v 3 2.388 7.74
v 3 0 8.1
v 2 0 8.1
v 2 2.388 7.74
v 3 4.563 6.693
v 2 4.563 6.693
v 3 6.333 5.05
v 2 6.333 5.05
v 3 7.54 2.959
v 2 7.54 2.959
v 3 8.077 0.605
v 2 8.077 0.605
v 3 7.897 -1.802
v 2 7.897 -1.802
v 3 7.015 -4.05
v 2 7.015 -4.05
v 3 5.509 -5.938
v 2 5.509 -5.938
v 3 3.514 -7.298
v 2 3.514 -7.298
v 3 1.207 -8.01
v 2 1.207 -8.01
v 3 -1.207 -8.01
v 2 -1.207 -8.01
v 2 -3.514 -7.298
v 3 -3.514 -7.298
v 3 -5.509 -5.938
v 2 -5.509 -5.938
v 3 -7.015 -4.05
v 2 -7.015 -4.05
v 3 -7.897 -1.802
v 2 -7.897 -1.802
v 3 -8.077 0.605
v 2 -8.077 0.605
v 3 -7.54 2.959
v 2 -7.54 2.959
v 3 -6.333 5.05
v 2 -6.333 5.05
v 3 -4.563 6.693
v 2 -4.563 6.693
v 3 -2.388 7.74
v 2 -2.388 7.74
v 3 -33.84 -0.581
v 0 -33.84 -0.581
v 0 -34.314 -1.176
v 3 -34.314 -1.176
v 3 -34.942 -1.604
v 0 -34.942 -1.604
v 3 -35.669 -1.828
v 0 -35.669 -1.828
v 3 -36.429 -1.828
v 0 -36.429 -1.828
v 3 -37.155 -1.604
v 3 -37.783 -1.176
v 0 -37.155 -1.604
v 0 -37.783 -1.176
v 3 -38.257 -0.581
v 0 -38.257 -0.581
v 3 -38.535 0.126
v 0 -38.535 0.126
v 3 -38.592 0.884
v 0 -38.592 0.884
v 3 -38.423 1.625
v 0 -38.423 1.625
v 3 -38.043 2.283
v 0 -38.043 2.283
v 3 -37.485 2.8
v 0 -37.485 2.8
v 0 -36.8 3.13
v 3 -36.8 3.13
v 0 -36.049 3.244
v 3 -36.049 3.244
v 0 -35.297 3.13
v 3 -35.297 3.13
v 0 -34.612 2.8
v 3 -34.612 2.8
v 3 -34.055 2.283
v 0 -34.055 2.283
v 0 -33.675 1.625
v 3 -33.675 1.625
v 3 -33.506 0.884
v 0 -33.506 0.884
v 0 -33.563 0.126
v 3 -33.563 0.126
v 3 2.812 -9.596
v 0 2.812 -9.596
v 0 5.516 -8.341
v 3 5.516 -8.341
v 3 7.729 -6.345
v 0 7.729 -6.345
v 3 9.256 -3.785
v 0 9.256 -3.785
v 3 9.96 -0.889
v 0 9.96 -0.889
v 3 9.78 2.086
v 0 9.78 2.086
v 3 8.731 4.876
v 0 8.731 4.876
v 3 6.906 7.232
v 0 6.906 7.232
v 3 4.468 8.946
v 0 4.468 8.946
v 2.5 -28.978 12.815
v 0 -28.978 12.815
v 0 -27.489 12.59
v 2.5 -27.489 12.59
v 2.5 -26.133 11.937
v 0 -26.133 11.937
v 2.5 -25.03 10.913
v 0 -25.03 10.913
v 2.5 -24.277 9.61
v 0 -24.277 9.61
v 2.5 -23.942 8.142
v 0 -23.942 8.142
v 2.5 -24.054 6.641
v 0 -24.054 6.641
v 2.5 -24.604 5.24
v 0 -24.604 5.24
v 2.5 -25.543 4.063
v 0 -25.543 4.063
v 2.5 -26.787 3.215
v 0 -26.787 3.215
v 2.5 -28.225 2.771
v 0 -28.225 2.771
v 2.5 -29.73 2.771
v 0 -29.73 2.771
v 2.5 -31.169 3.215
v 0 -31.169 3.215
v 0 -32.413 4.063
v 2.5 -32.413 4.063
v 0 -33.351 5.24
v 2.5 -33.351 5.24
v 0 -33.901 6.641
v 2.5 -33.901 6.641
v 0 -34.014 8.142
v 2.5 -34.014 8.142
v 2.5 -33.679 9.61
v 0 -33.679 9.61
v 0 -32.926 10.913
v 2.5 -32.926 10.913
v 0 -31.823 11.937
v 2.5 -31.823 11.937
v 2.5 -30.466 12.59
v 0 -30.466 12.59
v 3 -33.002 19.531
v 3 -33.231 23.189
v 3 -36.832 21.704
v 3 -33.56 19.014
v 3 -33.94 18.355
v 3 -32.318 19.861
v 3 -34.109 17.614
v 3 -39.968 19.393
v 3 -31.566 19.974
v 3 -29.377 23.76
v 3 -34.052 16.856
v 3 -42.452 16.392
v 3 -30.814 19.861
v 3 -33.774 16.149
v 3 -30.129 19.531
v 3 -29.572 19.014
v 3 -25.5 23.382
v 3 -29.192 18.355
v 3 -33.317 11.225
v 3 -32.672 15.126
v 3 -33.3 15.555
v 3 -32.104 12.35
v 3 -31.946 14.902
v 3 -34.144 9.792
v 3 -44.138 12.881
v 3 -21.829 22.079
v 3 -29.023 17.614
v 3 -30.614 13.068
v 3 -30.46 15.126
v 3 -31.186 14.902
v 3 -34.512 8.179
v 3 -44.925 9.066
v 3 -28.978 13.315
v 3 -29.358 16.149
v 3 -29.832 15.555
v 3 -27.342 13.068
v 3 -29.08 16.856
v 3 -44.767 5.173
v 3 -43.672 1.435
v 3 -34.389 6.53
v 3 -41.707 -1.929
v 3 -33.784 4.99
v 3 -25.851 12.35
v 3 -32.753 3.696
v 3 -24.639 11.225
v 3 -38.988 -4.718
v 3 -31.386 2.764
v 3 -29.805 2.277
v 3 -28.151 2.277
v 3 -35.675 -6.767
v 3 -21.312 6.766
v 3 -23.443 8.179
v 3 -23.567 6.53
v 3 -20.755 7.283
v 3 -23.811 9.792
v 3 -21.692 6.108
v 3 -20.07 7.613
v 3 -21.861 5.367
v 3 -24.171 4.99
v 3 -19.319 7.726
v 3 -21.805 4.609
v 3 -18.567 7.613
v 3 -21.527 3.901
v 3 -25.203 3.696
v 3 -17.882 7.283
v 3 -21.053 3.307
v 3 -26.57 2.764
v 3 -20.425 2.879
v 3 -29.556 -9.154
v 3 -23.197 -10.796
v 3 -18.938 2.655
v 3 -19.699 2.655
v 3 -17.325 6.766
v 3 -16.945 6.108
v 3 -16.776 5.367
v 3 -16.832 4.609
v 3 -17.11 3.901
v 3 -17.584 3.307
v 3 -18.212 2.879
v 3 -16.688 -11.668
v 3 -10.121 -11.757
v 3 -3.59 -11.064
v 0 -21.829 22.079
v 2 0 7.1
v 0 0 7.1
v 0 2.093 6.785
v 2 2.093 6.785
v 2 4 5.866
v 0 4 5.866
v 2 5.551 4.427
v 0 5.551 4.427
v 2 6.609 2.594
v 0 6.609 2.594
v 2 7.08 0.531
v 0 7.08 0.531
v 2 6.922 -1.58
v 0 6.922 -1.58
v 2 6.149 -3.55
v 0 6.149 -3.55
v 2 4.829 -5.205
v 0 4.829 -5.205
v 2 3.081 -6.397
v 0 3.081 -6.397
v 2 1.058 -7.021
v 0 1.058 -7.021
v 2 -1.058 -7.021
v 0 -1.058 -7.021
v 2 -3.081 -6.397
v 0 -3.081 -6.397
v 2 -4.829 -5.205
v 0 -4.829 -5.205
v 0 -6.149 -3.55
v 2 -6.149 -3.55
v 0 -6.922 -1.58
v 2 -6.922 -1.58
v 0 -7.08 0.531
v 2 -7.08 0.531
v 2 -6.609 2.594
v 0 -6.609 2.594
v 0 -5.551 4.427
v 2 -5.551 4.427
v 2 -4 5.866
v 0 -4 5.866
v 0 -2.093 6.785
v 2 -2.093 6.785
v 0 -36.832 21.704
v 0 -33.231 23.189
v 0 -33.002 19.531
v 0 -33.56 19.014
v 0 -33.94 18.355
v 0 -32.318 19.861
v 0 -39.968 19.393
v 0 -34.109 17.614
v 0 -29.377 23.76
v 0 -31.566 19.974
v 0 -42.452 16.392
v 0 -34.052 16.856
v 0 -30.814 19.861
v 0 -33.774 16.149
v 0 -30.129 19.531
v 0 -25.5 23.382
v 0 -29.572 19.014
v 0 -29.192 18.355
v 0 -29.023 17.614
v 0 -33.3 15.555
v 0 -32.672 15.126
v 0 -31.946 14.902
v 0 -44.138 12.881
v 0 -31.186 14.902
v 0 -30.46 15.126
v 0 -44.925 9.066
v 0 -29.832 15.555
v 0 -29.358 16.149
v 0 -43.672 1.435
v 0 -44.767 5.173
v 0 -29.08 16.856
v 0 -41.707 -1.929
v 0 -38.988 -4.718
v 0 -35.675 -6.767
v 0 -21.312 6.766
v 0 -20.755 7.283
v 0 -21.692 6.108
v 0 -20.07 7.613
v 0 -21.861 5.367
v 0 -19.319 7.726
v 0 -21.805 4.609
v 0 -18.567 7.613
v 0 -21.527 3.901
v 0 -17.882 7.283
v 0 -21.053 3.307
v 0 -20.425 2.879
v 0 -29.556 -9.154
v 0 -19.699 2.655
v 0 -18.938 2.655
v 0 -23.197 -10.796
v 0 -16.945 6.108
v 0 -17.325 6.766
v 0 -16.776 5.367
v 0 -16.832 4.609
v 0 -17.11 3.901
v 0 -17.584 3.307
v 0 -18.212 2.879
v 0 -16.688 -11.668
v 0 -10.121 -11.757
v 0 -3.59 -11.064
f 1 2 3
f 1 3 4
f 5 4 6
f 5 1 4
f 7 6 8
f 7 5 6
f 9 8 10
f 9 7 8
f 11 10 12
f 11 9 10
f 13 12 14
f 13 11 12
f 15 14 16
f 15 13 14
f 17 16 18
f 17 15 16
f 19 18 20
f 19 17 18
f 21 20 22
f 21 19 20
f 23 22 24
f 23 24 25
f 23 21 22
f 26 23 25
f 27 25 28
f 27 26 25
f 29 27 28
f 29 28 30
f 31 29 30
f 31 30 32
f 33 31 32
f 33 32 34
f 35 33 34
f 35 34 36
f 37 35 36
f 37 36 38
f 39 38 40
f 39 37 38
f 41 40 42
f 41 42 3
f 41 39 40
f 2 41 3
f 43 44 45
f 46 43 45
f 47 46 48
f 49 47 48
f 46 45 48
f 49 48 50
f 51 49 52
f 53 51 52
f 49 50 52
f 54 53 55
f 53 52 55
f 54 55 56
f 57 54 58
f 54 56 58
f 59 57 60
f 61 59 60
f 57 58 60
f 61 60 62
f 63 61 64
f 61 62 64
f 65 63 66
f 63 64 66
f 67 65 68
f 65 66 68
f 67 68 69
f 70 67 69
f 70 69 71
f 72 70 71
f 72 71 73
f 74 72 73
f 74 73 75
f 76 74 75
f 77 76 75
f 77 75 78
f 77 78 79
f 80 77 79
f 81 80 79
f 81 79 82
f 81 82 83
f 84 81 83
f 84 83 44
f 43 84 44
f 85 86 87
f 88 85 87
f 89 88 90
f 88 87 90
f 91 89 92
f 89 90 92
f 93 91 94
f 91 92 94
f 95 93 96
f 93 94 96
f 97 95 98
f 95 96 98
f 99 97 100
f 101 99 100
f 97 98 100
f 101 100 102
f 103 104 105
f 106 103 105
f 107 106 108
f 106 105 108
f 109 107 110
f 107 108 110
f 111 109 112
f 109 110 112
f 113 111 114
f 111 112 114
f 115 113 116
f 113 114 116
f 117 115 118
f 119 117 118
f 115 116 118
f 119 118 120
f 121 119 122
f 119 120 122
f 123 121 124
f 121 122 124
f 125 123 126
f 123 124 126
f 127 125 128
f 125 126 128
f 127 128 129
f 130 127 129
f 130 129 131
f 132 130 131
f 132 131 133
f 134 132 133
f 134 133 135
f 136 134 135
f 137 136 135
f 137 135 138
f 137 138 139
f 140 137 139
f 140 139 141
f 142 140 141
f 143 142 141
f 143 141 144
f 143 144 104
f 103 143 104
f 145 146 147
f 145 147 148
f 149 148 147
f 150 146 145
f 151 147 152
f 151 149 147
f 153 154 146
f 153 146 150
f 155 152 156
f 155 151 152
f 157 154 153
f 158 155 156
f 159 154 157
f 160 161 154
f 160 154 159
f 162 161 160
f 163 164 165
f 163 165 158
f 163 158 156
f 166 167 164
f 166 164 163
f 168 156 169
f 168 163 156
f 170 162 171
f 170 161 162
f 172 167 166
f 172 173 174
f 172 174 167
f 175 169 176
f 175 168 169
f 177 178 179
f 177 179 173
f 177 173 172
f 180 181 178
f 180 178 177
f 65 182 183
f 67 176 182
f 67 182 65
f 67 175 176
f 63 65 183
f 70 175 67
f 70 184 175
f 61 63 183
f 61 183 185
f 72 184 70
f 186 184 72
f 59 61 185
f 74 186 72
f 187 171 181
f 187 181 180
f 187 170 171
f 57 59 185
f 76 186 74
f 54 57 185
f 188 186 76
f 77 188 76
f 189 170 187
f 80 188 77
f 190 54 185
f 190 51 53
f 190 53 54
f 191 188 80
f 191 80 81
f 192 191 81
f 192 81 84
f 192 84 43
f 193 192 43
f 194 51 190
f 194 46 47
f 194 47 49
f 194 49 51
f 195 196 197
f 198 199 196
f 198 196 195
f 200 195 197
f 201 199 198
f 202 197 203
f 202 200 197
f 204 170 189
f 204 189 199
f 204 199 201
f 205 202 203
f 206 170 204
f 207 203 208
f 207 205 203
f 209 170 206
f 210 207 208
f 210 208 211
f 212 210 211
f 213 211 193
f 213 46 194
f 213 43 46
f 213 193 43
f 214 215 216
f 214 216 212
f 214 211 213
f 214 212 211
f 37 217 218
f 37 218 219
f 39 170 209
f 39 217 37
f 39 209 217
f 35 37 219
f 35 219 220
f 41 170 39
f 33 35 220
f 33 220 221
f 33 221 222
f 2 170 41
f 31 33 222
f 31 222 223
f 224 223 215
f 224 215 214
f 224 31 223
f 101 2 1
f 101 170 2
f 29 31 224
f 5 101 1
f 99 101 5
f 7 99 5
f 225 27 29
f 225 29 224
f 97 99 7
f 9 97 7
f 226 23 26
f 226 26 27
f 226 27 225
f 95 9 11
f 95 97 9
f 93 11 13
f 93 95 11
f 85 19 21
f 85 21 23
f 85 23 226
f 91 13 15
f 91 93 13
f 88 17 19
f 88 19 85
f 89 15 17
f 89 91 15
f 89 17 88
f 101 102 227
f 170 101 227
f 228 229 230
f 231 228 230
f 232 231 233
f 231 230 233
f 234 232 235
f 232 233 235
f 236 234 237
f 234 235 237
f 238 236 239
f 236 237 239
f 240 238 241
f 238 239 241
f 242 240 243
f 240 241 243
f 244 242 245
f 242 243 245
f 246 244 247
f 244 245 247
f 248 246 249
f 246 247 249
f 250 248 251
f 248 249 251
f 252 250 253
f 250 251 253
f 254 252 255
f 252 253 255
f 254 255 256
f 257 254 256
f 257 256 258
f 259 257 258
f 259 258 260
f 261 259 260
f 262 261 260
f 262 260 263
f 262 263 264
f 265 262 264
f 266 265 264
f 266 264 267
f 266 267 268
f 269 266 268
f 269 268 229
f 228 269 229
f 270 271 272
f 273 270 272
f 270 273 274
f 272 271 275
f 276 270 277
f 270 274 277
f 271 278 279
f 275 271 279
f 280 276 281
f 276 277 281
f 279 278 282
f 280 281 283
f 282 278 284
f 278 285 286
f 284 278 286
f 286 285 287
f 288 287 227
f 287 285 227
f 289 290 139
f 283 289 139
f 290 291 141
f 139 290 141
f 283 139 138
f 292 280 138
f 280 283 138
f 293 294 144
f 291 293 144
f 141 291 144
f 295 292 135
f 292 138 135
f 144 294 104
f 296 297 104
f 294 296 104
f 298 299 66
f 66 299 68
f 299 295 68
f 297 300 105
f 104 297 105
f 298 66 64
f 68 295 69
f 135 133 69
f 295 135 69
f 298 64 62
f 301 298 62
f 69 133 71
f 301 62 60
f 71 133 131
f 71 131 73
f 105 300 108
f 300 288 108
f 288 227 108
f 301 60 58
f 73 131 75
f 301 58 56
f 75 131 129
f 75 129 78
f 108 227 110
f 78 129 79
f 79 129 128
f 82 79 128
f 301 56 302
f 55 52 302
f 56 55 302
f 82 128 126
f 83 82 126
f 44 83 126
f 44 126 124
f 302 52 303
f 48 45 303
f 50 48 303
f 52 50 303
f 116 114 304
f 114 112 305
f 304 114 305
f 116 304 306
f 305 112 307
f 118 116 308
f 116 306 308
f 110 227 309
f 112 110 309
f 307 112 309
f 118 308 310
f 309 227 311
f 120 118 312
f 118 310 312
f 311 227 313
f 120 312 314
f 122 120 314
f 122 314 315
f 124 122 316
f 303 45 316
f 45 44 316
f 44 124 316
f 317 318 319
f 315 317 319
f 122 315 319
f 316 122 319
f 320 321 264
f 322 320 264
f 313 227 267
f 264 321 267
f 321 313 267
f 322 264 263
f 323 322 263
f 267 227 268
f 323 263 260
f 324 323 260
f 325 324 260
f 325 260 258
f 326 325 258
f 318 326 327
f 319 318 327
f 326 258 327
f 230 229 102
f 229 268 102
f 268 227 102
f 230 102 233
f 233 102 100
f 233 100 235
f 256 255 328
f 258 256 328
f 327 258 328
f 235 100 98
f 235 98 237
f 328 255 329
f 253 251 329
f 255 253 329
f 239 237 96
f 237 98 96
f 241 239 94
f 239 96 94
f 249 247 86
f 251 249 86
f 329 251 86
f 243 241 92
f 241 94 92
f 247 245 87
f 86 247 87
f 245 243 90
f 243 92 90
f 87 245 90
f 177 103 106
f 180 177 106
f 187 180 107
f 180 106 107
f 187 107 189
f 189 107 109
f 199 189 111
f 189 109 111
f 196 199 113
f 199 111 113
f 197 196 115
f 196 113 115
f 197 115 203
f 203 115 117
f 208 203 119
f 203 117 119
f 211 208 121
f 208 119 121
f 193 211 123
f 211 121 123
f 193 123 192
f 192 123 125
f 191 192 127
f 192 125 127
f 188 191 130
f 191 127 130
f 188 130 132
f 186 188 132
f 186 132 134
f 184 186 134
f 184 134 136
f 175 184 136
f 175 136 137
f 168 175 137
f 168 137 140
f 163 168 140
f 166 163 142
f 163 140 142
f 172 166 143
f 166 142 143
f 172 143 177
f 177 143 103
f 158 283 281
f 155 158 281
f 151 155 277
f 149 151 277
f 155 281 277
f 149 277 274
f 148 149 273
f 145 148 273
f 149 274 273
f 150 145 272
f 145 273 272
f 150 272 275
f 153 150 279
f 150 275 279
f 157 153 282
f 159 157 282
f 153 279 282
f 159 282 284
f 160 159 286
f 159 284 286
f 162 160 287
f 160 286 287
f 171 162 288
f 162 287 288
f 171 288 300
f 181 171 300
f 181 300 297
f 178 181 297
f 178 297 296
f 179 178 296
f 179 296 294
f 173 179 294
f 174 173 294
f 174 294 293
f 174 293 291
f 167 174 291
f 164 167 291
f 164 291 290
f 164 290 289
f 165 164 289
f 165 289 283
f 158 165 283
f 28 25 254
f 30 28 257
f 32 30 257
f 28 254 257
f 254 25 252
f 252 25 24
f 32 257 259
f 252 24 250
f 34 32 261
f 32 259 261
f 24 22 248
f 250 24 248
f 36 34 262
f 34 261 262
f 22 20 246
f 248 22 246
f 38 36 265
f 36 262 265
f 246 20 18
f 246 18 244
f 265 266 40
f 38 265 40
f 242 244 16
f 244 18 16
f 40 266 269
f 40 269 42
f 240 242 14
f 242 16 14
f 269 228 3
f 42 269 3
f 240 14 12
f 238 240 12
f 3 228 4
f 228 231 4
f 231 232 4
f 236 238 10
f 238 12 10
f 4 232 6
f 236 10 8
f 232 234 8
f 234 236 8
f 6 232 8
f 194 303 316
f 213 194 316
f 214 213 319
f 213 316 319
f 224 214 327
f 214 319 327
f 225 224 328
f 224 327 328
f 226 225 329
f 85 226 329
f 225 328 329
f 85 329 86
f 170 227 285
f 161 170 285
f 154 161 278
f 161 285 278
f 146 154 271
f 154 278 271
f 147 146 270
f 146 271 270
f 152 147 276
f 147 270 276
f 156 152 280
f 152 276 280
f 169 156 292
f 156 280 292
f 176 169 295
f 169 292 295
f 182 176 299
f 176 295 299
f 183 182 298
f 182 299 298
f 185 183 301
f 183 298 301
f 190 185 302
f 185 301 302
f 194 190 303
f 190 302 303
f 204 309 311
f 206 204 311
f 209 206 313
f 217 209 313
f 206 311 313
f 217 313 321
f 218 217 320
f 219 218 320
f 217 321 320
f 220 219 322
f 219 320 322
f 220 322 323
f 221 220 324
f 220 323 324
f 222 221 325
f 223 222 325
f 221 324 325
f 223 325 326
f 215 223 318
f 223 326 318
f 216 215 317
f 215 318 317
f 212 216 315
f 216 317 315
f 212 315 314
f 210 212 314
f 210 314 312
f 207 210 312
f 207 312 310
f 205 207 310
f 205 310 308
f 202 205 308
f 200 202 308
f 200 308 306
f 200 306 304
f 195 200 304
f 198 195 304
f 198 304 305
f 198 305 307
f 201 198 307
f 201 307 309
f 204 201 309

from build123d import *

# Parameters (mm, degrees)
EXTRUDE_1_DEPTH          = 3
SKETCH_2_R               = 7.1
SKETCH_2_R_2             = 5.05
CUT_EXTRUDE_1_DEPTH      = 10
SKETCH_3_R               = 2.55
CUT_EXTRUDE_2_DEPTH      = 10
PATTERN_CIRCULAR_1_COUNT = 3
CHAMFER_1_SIZE           = 0.5
SKETCH_4_R               = 8.1
CUT_EXTRUDE_3_DEPTH      = 1


with BuildPart() as part:
    # 草图1 → 凸台-拉伸1 (new body)
    with BuildSketch(Plane(origin=(0, 0, 0), x_dir=(0, 0, -1), z_dir=(1, 0, 0))):
        with BuildLine():
            ThreePointArc((6.766526321, -35.674580026), (11.667792815, -16.687604516), (9.596471541, 2.812069339))
            ThreePointArc((9.596471541, 2.812069339), (0.889352151, 9.960374127), (-8.946463525, 4.467750037))
            Line((-8.946463525, 4.467750037), (-22.078912993, -21.829374729))
            ThreePointArc((-22.078912993, -21.829374729), (-14.688022315, -43.402261843), (6.766526321, -35.674580026))
        make_face()
    extrude(amount=EXTRUDE_1_DEPTH)

    # 草图2 → 切除-拉伸1 (cut)
    with BuildSketch(Plane.ZY):
        Circle(SKETCH_2_R)
        with Locations((7.764571353, -28.977774789)):
            Circle(SKETCH_2_R_2)
    extrude(amount=-CUT_EXTRUDE_1_DEPTH, mode=Mode.SUBTRACT)

    # 草图3 → 切除-拉伸2 (cut)
    with BuildSketch(Plane.ZY):
        with Locations((5.176380902, -19.318516526)):
            Circle(SKETCH_3_R)
    cut_extrude_2 = extrude(amount=-CUT_EXTRUDE_2_DEPTH, mode=Mode.SUBTRACT)

    # 阵列(圆周)1: 切除-拉伸2 ×3 about axis
    pattern_circular_1_axis = Axis((0, -28.977774789, 7.764571353), (1, 0, 0))
    for i in range(1, PATTERN_CIRCULAR_1_COUNT):
        add(cut_extrude_2.rotate(pattern_circular_1_axis, i * 360 / PATTERN_CIRCULAR_1_COUNT), mode=Mode.SUBTRACT)

    # 倒角1
    chamfer_1_edges = [part.edges().sort_by_distance(p)[0] for p in [
        (3, -28.977774789, 2.714571353),
    ]]
    chamfer(chamfer_1_edges, length=CHAMFER_1_SIZE)

    # 草图4 → 切除-拉伸3 (cut)
    with BuildSketch(Plane.ZY.offset(-3)):
        Circle(SKETCH_4_R)
    extrude(amount=CUT_EXTRUDE_3_DEPTH, mode=Mode.SUBTRACT)


solid = part.part
